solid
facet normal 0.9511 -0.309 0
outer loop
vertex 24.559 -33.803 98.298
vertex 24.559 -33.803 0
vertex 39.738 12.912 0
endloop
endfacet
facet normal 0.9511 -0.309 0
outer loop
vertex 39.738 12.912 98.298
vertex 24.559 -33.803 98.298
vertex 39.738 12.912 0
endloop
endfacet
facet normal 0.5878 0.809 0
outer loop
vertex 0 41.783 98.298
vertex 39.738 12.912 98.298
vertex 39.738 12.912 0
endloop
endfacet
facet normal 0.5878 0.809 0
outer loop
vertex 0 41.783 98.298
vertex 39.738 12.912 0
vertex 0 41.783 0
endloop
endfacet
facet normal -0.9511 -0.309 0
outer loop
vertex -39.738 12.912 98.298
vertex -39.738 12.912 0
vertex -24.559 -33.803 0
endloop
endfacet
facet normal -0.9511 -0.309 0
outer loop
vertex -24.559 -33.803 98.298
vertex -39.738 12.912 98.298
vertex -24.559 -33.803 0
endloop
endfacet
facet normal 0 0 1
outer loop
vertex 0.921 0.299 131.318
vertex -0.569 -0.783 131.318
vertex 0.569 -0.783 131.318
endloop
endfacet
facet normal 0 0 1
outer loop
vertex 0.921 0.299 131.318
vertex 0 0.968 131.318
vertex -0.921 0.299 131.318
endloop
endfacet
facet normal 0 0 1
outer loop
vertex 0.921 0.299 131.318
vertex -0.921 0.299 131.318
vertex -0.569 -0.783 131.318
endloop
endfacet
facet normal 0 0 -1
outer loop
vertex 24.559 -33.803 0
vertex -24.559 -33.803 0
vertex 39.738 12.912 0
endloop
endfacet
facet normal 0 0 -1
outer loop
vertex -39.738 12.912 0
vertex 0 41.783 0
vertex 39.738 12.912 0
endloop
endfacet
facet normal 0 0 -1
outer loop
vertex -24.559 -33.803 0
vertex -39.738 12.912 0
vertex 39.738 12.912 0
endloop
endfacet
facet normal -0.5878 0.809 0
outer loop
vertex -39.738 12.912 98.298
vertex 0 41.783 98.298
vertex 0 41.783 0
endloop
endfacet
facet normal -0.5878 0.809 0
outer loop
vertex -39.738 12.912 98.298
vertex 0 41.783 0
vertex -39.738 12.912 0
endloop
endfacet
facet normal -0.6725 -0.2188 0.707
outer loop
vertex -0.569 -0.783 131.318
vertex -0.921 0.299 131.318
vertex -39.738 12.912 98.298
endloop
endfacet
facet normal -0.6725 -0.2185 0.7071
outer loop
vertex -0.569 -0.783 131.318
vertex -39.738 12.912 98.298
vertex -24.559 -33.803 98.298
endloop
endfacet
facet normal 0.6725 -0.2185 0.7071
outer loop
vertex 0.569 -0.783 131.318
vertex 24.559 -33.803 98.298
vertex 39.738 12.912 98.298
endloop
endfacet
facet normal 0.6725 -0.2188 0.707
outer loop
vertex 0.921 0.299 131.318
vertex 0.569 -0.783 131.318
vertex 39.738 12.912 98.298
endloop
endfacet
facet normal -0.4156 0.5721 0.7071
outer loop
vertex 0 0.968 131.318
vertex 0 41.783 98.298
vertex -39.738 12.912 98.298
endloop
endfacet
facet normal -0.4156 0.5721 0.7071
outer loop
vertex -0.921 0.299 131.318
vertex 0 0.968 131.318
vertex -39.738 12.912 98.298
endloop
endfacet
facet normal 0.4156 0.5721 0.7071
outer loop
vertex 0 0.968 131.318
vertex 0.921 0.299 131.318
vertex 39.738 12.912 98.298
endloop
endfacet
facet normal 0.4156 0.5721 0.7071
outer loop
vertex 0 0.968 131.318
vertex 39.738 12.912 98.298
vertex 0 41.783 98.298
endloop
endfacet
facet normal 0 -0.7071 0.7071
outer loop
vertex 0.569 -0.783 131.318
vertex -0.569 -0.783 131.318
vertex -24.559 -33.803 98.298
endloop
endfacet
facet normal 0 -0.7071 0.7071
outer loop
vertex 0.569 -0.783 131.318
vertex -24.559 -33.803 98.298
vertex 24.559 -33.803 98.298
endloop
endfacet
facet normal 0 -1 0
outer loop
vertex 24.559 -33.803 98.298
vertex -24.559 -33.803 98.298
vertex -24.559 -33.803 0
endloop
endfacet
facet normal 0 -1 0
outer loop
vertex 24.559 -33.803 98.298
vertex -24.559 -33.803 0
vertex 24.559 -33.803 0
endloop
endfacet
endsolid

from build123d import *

# Parameters (mm, degrees)
F1_DEPTH = 131.318
F2_SIZE  = 33.02


with BuildPart() as f1:
    # F0 (on Top) → F1 (new body)
    with BuildSketch(Plane.XY):
        Polygon((-24.559464, -33.803202), (24.559464, -33.803202), (39.738047, 12.911674), (0, 41.783056), (-39.738047, 12.911674), align=None)
    extrude(amount=F1_DEPTH)

    # F2
    f2_edges = [f1.edges().sort_by_distance(p)[0] for p in [
        (0, -33.803202, 131.318),
        (-32.148756, -10.445764, 131.318),
        (-19.869024, 27.347365, 131.318),
        (19.869024, 27.347365, 131.318),
        (32.148756, -10.445764, 131.318),
    ]]
    chamfer(f2_edges, length=F2_SIZE)


solid = f1.part
